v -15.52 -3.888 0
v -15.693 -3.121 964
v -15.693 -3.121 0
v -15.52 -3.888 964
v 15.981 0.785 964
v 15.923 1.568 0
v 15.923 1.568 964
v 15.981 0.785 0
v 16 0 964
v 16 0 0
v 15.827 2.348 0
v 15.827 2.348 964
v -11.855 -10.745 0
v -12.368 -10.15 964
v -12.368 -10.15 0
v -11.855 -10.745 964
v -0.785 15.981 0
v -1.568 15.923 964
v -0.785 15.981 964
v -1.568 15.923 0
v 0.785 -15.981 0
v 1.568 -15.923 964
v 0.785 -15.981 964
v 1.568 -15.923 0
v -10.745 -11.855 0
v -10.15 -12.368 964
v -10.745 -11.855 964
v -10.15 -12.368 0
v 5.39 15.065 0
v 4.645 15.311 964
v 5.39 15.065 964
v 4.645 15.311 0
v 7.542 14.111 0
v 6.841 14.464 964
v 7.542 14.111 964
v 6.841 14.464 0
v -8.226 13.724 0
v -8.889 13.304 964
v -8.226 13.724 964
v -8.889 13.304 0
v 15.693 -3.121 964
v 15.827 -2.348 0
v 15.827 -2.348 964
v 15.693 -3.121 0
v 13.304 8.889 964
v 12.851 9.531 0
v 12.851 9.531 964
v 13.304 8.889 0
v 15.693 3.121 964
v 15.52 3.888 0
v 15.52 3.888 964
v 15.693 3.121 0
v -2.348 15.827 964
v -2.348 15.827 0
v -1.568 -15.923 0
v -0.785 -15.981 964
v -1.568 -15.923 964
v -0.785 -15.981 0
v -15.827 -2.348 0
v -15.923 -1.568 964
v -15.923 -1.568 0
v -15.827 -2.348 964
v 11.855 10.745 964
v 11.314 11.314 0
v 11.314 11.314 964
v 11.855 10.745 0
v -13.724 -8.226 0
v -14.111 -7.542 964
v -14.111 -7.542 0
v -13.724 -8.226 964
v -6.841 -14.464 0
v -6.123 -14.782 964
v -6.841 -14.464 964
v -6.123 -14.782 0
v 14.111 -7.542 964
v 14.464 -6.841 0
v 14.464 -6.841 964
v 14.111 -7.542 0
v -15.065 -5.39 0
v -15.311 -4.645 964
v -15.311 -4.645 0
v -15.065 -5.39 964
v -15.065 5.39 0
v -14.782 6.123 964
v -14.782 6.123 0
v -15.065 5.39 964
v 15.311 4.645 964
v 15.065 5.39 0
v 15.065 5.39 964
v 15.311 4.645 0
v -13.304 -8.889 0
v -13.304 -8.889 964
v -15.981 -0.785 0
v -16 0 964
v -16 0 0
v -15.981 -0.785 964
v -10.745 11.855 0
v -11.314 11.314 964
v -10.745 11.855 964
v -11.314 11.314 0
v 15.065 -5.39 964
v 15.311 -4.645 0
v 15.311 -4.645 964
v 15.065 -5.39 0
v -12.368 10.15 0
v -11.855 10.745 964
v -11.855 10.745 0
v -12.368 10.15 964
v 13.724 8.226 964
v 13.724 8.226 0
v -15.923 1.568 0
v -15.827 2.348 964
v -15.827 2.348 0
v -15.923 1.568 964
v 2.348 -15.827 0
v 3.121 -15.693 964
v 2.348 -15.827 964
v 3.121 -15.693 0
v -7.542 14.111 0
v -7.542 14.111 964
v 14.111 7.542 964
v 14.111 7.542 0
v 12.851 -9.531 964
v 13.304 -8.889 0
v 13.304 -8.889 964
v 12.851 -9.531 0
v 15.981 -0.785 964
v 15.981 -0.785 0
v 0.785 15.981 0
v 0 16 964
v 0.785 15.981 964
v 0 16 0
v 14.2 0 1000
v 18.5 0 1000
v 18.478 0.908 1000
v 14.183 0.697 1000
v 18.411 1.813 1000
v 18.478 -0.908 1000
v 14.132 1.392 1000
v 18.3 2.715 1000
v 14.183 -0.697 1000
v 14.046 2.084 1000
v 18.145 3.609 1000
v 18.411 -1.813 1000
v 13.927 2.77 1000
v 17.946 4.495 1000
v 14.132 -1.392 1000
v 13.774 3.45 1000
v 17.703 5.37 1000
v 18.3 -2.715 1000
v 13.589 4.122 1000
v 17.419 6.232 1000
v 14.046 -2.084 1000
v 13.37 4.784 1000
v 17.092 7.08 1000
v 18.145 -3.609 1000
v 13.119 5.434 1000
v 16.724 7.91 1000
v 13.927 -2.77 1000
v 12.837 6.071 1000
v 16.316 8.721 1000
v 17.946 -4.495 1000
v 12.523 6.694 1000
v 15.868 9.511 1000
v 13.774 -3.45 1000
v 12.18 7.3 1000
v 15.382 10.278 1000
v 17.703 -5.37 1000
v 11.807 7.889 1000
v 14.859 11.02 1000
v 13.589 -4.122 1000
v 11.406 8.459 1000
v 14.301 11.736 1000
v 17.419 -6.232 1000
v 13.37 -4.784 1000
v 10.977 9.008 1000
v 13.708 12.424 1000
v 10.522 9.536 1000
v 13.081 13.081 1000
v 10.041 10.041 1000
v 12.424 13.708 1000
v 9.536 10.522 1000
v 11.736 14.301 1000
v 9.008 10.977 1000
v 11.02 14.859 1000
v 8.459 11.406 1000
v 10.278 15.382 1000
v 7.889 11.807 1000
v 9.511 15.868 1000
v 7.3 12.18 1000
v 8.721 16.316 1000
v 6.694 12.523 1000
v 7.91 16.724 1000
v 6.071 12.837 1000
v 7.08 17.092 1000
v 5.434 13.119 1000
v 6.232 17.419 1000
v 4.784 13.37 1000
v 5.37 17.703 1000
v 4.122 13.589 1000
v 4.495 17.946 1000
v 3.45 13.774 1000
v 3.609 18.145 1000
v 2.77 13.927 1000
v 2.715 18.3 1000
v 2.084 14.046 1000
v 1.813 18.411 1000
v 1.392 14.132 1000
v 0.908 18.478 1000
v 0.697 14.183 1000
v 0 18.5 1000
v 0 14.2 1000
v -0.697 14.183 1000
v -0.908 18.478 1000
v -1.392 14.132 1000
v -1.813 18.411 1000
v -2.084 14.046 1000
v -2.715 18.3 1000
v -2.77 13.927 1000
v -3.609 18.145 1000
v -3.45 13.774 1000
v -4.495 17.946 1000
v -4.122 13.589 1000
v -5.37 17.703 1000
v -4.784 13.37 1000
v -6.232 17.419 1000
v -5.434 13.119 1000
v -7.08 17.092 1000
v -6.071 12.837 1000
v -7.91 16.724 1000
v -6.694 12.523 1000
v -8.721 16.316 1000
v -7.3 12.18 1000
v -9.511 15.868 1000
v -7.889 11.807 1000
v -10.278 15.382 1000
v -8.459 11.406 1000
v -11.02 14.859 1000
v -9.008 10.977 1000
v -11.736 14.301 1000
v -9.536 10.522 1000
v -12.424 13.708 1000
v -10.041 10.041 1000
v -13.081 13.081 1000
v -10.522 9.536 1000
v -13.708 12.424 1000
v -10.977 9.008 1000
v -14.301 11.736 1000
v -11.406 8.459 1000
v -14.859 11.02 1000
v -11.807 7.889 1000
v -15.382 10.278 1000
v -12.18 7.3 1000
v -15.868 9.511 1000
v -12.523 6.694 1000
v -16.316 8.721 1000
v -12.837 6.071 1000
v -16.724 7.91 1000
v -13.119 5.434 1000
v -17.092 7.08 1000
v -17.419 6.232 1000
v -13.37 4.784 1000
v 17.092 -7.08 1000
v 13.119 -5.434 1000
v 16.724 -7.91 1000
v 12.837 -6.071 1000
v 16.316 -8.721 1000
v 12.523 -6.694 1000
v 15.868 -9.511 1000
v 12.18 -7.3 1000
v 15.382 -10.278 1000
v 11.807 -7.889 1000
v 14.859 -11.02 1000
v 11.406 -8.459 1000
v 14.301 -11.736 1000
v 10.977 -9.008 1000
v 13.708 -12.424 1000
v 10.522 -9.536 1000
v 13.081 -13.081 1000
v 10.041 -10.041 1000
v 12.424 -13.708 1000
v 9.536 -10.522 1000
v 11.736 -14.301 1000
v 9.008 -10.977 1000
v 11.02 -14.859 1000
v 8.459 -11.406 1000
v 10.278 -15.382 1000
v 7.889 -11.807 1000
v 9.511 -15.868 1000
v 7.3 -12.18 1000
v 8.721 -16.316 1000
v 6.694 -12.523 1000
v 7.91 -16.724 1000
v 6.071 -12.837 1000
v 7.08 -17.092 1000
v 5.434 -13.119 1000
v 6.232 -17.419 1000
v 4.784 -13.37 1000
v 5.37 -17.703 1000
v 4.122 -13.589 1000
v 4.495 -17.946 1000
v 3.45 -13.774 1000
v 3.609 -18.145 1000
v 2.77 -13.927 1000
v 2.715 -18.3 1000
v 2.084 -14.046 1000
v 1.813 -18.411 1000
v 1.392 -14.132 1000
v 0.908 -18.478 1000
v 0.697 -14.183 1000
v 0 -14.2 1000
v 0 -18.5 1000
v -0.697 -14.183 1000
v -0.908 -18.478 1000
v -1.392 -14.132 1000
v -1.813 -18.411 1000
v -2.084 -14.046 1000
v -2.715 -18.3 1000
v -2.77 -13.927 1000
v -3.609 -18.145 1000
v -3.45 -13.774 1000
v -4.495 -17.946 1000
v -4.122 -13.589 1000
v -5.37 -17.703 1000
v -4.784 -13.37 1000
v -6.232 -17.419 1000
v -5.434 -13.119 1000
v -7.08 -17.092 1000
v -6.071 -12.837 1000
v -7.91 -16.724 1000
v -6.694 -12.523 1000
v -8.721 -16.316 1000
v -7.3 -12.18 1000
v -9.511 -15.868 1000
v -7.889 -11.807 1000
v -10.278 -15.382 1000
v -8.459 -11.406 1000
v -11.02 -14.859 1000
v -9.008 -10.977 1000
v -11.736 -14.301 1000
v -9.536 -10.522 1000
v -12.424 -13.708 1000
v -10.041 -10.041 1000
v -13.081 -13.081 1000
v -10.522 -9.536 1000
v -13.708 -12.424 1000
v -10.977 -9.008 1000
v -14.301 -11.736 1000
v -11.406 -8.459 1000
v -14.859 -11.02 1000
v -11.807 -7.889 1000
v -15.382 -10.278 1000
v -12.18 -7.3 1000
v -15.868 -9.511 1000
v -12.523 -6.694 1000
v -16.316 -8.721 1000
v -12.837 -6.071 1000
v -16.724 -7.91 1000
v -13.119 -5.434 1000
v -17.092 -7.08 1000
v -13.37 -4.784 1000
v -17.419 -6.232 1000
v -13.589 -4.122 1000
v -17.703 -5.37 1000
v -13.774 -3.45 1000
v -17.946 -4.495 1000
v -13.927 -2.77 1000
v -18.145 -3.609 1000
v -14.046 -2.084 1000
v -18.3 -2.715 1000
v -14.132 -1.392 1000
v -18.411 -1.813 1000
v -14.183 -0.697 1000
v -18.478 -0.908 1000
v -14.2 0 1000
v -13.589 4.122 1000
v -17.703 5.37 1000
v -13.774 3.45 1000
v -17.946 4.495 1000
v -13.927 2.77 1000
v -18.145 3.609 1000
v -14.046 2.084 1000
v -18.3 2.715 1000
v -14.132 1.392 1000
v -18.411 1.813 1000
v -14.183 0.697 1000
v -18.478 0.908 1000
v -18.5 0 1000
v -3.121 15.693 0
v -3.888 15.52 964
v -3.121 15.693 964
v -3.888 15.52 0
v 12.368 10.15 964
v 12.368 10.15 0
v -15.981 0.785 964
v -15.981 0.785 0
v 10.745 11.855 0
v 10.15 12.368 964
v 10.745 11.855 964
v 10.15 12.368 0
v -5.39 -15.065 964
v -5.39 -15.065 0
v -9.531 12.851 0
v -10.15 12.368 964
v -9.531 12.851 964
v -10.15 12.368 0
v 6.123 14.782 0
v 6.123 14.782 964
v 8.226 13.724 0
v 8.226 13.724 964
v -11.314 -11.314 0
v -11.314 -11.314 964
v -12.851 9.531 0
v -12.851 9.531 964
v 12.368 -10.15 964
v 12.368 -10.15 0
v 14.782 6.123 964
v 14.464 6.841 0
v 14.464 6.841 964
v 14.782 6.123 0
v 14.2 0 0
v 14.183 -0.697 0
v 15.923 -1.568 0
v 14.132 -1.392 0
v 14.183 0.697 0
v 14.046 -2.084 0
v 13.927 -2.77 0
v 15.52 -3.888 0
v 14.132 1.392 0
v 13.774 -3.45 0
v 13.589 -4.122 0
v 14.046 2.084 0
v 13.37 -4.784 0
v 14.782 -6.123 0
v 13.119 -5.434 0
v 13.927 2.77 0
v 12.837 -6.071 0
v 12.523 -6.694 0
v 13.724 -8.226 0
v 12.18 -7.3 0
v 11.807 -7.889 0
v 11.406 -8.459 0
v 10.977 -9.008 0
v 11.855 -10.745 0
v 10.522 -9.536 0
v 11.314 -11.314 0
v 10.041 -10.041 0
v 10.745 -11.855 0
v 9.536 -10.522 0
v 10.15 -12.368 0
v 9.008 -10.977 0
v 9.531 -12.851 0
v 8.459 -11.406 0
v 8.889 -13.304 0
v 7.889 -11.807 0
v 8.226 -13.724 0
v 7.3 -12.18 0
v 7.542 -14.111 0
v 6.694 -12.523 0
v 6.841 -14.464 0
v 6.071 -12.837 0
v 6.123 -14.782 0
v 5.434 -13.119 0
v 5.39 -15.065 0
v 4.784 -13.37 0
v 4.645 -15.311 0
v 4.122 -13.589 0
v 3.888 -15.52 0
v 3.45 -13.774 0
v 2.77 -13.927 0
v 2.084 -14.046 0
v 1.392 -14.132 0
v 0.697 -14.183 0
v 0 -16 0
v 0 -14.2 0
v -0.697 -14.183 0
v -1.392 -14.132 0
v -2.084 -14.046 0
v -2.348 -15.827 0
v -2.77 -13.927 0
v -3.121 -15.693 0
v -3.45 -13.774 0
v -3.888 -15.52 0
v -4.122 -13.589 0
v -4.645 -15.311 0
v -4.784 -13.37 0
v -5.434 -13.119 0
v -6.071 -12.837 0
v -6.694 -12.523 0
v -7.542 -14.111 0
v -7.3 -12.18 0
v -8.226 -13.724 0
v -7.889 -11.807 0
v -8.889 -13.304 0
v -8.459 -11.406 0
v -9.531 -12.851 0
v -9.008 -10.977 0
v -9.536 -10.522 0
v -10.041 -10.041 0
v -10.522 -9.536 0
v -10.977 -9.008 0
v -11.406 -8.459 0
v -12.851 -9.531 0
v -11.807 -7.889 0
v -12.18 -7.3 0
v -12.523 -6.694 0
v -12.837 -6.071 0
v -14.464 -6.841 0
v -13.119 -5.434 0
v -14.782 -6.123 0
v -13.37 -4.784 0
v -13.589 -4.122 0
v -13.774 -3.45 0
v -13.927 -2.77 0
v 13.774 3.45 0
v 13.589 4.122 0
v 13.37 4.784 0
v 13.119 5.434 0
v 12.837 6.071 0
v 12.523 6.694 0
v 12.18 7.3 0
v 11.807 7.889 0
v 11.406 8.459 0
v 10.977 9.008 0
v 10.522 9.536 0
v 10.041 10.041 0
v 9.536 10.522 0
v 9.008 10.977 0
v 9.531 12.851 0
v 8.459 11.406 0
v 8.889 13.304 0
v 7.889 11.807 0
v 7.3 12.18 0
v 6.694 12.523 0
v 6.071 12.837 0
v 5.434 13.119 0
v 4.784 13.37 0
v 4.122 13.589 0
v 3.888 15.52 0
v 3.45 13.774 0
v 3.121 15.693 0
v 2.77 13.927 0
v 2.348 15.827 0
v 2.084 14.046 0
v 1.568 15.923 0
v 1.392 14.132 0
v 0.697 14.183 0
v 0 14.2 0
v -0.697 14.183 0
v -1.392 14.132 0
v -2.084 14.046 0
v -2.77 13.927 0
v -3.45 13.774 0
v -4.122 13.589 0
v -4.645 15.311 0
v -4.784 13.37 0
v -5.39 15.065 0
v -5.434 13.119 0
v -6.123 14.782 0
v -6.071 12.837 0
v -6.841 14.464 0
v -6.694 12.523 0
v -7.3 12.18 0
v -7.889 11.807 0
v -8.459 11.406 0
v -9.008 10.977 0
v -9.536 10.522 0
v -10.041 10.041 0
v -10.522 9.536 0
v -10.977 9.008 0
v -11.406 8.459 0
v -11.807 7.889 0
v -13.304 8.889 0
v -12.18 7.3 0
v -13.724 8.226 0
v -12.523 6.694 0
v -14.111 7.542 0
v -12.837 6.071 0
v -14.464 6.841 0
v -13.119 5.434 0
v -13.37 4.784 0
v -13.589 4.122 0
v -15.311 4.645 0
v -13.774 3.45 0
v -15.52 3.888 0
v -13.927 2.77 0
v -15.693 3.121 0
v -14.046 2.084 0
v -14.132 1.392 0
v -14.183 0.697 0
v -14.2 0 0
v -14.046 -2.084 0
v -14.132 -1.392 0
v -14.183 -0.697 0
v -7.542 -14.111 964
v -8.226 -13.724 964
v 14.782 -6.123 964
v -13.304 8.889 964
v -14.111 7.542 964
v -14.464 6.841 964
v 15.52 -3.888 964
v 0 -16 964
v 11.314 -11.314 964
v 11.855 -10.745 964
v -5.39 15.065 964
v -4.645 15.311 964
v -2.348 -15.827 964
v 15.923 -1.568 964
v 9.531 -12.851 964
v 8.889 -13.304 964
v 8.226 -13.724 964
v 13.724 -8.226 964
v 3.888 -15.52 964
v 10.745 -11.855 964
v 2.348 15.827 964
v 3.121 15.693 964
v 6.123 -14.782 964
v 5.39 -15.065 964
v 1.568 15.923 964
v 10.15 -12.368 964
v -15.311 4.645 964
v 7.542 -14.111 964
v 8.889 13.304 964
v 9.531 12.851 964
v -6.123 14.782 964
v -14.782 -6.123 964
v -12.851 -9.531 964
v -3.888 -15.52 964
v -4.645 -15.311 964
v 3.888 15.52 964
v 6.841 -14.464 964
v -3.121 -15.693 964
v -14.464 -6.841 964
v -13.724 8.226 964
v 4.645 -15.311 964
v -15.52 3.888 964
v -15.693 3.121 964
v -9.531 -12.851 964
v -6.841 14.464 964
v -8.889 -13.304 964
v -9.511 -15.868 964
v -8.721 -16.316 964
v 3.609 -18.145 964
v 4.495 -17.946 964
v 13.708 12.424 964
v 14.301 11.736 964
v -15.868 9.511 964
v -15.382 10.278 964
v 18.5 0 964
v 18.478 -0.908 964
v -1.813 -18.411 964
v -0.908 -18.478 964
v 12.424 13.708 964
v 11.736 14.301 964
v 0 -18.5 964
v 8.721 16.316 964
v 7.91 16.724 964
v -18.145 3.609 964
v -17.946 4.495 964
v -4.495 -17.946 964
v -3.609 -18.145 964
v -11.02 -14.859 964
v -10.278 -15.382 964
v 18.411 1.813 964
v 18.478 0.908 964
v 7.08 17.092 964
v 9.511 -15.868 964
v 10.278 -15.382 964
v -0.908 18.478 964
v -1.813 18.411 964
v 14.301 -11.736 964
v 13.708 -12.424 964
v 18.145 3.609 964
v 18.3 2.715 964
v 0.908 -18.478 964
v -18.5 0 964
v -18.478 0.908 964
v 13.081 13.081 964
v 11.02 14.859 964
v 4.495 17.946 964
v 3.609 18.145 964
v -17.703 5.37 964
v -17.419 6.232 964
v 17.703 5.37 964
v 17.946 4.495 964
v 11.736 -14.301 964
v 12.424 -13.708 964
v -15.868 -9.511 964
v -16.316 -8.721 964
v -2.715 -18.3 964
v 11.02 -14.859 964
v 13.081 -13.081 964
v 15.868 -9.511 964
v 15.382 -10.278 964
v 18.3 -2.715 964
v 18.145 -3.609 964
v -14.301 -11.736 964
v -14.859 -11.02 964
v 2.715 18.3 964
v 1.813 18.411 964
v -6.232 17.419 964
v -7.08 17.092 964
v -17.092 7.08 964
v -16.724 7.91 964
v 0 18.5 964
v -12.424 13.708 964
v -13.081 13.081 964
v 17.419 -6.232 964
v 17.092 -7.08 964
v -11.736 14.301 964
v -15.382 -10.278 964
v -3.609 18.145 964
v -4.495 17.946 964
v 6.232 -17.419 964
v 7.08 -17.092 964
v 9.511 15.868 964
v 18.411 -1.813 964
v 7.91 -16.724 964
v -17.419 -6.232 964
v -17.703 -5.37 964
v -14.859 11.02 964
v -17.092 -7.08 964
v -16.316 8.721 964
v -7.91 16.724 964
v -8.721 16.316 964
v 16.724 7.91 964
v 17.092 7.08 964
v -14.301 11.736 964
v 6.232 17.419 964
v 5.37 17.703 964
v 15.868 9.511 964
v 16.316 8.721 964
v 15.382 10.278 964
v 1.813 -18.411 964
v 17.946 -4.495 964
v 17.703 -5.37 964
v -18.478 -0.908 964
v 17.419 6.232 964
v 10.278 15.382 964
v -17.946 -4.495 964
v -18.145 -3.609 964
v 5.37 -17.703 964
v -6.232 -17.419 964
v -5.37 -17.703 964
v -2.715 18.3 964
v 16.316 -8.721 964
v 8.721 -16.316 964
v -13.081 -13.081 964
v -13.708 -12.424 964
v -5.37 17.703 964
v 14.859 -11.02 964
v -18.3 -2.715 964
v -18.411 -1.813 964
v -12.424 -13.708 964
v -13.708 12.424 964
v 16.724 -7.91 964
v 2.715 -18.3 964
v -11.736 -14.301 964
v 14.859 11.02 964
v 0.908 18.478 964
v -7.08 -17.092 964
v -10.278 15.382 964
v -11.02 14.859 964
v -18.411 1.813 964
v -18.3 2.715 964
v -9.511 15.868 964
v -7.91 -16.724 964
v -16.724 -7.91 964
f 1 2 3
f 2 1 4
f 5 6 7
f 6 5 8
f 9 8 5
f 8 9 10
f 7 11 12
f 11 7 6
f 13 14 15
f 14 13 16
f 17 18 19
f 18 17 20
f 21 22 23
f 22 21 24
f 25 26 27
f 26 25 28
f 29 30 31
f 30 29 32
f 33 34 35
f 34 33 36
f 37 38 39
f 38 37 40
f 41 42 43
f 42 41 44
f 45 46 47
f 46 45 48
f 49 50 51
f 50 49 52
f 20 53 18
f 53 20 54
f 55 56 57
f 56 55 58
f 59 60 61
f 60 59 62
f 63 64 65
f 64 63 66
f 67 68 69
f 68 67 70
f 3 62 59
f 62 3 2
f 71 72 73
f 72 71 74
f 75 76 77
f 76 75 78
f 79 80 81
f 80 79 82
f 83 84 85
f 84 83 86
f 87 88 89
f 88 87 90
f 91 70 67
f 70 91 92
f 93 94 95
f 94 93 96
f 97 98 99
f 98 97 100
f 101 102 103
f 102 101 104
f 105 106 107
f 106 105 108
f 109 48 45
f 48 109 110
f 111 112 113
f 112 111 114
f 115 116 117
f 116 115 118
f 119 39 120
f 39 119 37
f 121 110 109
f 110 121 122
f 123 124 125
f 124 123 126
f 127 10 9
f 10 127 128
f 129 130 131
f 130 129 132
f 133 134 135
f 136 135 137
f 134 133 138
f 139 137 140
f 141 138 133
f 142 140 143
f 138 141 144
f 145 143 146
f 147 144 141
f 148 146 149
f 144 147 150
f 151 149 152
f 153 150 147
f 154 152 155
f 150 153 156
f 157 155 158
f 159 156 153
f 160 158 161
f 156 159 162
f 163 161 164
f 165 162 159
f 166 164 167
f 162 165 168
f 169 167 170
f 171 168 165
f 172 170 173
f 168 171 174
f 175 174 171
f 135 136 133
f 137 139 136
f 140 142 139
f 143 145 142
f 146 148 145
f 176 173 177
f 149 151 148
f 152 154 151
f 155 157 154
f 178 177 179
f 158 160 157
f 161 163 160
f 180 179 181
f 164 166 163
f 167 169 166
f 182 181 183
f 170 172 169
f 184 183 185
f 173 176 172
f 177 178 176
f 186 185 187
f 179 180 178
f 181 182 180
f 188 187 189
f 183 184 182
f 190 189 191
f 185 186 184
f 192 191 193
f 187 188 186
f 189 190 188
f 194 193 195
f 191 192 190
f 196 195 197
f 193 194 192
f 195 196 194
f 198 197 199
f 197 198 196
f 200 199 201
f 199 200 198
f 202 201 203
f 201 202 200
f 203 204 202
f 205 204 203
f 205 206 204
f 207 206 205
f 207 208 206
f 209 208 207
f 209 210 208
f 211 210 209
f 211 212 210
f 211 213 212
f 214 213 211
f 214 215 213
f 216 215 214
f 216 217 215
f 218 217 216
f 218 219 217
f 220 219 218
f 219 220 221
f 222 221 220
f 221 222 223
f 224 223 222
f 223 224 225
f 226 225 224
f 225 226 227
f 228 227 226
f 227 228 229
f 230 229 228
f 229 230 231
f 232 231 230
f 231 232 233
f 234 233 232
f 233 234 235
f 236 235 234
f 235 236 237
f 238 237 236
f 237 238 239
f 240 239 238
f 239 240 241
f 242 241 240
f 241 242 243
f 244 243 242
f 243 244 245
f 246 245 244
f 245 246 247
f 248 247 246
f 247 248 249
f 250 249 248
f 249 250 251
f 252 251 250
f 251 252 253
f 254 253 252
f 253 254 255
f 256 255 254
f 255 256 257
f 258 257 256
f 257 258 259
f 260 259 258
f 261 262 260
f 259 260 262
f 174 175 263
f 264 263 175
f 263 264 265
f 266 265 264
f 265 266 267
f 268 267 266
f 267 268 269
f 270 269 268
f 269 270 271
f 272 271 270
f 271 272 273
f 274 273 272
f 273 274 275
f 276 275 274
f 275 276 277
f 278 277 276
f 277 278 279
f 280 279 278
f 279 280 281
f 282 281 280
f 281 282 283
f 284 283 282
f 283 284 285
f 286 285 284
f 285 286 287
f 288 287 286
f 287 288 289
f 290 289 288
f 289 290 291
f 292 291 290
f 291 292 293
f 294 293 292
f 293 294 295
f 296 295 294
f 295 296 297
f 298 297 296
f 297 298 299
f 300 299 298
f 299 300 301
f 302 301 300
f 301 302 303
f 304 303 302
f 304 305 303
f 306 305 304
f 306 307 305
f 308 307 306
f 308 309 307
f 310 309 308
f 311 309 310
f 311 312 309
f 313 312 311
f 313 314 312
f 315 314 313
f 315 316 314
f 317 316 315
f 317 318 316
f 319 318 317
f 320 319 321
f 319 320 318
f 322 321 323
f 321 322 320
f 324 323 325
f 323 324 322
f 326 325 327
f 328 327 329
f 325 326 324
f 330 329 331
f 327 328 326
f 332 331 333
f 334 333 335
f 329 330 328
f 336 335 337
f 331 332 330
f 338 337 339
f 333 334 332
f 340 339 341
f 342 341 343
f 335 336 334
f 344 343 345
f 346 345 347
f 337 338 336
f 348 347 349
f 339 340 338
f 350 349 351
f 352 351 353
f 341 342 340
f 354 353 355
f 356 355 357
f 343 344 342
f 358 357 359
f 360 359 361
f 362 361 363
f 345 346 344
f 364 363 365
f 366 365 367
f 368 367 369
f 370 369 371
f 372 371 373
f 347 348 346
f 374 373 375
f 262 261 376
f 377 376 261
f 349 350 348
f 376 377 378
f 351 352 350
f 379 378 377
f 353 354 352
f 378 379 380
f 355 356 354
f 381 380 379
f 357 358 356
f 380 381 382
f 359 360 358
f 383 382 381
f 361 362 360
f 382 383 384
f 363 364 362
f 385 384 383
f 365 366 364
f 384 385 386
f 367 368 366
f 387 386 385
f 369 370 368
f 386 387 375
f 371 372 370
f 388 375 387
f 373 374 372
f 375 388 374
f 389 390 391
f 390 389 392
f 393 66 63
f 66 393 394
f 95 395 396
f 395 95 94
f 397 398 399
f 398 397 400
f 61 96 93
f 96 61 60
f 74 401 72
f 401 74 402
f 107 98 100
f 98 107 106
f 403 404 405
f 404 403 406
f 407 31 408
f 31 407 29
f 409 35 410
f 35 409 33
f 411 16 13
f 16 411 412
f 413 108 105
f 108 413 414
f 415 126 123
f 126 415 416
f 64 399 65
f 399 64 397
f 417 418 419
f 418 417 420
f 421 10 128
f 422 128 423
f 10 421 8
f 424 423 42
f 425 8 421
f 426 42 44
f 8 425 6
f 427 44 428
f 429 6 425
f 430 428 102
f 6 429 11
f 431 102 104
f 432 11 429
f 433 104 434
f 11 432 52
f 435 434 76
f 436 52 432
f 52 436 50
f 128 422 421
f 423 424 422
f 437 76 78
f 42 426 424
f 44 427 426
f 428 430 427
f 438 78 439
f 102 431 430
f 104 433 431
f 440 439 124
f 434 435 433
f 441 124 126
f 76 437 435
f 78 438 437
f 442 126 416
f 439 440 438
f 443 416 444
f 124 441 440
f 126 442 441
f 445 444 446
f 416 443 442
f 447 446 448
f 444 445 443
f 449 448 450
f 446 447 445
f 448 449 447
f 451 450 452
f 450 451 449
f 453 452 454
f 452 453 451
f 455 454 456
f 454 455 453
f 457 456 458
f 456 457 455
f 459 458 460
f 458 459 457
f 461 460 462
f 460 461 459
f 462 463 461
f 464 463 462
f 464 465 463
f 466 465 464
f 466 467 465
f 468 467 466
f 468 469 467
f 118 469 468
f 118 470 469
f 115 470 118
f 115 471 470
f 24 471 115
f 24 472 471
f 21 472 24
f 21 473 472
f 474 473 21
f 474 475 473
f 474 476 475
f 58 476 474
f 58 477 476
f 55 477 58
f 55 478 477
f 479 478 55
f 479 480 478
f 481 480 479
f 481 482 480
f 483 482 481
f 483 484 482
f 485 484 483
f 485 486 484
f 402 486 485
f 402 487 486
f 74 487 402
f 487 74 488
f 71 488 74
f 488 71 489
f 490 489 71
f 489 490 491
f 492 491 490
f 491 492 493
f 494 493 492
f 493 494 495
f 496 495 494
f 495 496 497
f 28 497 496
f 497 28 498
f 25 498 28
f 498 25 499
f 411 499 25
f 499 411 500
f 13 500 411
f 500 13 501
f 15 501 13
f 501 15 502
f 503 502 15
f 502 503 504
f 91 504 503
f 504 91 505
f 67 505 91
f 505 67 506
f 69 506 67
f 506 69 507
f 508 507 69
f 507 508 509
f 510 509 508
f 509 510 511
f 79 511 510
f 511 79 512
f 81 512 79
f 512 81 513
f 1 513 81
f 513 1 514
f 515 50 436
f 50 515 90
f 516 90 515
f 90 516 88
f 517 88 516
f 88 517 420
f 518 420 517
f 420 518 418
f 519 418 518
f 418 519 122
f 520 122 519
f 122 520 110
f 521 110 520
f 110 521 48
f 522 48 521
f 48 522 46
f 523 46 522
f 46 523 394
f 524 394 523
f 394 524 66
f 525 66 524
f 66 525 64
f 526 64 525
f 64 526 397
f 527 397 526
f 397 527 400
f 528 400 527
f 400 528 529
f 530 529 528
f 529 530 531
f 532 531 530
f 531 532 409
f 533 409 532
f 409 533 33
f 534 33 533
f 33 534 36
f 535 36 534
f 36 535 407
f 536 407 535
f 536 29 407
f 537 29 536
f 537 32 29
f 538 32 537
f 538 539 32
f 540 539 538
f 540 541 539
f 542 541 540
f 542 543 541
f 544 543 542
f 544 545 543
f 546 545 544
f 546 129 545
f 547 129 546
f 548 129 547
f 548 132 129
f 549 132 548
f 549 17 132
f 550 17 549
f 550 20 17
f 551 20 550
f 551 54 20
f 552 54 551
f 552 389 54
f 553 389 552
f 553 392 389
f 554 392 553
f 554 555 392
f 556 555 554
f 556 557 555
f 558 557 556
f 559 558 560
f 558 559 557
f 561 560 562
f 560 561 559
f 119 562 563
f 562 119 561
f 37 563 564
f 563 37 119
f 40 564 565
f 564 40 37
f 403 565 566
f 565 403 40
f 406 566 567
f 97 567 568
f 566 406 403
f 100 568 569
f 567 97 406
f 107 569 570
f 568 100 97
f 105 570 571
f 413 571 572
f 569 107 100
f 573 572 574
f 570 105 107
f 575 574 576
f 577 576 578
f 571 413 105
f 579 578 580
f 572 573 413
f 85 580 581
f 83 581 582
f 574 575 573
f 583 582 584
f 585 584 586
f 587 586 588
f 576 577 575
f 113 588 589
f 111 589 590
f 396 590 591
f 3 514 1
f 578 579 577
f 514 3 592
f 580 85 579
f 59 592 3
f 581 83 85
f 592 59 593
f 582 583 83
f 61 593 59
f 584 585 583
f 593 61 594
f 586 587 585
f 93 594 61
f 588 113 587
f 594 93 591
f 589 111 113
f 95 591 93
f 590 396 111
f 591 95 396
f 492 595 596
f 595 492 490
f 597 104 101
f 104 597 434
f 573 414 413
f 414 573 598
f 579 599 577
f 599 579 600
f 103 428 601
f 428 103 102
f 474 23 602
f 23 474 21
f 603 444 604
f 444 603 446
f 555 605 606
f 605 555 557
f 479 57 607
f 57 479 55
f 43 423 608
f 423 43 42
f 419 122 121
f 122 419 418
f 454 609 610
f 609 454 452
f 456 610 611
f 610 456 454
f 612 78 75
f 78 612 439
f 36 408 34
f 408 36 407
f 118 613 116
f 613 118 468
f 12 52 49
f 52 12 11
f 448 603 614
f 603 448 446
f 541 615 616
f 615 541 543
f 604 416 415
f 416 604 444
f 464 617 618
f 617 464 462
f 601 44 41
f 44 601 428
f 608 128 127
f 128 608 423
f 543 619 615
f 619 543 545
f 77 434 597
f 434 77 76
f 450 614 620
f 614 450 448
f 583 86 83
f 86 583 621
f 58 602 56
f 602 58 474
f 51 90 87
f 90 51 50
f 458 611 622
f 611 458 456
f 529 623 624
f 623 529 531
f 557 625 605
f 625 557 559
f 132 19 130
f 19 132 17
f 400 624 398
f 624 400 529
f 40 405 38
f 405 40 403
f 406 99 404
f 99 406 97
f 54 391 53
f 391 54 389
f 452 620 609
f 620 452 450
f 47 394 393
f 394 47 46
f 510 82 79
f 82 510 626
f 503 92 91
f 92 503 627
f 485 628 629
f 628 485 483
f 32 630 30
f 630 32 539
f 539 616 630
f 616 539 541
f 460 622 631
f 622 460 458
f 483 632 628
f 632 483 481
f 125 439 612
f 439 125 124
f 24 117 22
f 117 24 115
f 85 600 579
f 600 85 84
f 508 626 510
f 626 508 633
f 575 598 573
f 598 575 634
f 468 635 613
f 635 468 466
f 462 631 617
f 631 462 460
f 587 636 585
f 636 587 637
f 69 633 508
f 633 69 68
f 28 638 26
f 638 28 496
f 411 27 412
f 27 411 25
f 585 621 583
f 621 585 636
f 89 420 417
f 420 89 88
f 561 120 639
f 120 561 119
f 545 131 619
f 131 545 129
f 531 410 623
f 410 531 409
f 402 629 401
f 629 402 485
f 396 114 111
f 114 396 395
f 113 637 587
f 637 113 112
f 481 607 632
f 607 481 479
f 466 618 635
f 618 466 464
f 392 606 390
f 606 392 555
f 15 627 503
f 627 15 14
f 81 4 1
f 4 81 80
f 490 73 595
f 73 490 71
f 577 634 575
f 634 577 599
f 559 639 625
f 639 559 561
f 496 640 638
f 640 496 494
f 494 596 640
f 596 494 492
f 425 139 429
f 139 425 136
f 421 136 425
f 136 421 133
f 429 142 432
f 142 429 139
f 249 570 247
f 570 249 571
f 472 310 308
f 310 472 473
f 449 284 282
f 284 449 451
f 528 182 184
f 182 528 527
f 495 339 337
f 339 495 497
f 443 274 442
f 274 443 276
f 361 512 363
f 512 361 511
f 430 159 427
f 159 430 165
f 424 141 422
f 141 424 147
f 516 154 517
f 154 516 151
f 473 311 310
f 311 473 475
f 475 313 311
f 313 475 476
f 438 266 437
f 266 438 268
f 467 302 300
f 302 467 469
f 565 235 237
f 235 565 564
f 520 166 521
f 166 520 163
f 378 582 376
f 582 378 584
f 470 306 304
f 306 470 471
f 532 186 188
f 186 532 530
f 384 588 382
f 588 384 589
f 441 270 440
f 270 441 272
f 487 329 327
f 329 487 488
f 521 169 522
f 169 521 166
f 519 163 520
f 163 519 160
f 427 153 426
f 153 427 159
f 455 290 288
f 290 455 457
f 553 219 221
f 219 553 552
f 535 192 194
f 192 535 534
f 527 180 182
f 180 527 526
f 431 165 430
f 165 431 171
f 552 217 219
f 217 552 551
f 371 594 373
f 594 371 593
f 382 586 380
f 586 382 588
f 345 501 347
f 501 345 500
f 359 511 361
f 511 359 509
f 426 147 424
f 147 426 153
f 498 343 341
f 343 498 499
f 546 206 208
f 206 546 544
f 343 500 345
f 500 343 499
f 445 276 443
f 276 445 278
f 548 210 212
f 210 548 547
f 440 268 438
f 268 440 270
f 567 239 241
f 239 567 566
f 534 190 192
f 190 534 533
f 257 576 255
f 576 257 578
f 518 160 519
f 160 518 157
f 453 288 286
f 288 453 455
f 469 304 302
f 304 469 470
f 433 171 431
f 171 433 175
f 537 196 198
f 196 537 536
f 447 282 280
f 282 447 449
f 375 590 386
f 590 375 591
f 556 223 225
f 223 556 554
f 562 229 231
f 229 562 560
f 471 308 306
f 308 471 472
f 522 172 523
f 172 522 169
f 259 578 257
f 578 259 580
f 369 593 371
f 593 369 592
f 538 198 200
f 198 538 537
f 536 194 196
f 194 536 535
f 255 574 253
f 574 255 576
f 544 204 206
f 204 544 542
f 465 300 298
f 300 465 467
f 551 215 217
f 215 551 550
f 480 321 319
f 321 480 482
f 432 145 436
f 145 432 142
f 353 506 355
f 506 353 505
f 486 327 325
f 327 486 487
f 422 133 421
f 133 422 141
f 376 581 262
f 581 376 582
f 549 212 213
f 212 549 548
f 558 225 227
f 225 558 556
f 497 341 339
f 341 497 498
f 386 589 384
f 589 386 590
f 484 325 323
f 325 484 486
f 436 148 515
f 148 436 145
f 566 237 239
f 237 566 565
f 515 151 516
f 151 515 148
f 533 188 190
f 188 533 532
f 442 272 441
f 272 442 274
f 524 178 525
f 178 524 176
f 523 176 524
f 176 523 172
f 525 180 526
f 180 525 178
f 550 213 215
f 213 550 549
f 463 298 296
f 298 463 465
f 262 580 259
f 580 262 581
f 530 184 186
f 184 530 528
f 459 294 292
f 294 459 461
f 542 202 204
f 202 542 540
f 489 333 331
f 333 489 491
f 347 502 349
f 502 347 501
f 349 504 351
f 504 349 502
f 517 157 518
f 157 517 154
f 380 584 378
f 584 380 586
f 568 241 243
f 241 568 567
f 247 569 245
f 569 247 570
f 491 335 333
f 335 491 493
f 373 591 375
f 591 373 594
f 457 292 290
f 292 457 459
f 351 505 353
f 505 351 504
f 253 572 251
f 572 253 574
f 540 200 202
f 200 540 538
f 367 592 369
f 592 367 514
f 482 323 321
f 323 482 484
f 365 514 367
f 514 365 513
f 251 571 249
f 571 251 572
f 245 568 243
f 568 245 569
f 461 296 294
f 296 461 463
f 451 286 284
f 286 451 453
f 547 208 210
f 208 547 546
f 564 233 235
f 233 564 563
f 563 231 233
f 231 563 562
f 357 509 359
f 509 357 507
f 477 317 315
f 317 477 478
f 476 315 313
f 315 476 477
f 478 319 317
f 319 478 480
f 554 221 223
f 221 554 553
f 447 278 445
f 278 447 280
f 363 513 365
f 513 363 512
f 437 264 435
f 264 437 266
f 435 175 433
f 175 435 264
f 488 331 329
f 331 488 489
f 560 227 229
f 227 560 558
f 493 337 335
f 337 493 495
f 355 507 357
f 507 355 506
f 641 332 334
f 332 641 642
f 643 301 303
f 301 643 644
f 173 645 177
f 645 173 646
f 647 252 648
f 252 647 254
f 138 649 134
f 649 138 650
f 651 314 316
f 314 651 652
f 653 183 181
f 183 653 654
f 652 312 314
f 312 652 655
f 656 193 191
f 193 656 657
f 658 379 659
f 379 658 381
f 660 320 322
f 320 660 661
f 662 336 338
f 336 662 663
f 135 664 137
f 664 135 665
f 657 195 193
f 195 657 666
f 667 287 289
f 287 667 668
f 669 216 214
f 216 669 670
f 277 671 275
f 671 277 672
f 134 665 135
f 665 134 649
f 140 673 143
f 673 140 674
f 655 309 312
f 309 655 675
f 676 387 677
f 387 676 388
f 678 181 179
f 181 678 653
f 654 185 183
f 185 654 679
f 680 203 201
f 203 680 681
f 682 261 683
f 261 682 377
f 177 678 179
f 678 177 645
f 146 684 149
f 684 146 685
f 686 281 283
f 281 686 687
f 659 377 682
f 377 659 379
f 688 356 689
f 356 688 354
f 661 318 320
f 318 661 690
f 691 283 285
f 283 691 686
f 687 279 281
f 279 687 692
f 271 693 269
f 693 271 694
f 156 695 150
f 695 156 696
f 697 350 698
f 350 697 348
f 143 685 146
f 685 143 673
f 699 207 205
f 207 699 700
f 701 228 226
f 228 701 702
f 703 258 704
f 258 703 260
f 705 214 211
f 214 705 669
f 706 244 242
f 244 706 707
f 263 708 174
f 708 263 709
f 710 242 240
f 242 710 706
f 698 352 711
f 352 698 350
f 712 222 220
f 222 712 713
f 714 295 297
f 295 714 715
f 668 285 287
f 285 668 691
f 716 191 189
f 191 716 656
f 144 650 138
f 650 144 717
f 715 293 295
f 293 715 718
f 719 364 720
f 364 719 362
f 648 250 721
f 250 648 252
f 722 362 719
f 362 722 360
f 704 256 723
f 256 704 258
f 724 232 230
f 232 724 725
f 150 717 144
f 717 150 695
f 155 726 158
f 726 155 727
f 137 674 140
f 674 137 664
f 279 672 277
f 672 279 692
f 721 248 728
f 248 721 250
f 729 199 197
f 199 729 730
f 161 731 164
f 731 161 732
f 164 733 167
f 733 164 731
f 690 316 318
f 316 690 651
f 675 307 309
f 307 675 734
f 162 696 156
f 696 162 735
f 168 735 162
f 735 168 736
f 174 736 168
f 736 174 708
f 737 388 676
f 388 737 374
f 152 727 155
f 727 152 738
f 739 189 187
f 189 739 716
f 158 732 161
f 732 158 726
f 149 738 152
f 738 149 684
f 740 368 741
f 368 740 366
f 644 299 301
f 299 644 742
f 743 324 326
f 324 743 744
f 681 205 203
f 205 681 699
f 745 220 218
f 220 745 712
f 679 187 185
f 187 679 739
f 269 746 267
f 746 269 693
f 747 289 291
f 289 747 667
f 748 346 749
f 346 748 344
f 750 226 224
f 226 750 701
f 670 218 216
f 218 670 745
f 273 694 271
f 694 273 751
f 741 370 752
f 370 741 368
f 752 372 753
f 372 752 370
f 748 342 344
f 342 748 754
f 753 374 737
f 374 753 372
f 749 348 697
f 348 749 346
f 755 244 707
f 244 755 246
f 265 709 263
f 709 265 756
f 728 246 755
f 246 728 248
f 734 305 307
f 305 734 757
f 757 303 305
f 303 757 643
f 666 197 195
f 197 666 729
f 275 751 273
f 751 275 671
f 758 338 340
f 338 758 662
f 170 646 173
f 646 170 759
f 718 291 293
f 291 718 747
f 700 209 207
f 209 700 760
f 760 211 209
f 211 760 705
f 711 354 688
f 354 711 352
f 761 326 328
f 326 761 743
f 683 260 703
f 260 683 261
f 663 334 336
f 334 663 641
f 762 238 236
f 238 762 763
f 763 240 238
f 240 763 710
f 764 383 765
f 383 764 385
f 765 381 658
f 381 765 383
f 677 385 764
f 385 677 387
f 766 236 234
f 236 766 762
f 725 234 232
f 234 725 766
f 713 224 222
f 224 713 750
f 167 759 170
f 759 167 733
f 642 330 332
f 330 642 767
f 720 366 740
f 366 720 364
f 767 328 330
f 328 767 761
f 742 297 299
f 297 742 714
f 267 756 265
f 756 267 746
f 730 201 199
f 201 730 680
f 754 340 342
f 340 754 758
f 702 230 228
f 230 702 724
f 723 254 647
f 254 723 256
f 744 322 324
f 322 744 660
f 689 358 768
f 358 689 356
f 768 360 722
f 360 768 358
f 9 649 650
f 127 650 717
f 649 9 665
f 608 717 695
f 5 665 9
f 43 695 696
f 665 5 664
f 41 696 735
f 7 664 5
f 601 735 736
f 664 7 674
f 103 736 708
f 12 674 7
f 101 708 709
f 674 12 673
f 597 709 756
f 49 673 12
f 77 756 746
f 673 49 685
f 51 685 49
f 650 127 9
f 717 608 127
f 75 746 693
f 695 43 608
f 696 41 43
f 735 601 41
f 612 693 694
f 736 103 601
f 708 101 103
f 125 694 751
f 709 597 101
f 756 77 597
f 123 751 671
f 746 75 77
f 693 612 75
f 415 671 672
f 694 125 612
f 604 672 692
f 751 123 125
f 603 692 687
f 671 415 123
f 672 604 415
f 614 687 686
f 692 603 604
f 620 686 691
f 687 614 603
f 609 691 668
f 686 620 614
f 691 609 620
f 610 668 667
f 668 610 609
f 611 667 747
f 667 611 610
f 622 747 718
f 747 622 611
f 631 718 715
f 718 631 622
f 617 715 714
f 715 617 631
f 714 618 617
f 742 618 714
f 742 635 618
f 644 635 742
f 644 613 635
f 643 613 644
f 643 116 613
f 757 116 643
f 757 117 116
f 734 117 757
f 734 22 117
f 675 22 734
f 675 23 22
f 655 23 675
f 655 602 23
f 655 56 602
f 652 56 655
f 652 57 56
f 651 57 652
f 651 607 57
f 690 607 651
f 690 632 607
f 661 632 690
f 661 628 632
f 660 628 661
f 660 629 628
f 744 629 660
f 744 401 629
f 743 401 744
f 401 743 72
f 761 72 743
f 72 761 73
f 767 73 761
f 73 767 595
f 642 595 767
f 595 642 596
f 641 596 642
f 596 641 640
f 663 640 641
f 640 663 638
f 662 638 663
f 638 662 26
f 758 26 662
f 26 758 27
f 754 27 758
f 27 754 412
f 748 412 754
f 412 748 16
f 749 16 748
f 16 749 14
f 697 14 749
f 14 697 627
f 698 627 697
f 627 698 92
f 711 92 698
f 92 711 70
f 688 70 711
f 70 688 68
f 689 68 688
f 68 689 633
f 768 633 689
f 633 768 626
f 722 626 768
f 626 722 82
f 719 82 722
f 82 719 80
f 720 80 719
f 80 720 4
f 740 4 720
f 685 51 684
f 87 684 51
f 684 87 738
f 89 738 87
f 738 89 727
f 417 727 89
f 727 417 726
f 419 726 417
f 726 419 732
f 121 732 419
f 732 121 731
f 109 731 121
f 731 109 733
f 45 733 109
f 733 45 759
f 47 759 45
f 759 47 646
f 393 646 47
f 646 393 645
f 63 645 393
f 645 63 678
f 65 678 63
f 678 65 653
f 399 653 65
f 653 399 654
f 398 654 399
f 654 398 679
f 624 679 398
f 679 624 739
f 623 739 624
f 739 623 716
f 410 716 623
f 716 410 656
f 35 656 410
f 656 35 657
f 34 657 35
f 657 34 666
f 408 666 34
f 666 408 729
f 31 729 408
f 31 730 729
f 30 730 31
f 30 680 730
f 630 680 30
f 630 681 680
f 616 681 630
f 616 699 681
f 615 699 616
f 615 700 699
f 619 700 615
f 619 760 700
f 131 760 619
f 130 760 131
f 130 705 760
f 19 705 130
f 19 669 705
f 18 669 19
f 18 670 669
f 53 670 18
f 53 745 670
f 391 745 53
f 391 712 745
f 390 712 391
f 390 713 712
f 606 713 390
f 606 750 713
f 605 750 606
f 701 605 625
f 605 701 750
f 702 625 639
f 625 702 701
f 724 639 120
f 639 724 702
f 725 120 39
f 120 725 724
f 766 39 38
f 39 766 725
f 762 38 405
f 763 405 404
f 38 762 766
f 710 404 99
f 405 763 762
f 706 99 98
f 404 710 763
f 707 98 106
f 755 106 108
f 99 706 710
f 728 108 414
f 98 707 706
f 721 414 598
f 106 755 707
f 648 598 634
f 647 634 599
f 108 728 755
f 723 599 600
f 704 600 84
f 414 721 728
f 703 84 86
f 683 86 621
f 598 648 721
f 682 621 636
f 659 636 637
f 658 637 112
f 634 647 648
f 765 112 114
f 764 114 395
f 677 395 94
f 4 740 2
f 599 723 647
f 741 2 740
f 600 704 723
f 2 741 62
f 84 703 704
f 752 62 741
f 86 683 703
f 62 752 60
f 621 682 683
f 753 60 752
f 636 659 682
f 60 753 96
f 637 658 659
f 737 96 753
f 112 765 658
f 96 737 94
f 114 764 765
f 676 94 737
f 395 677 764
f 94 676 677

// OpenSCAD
// HT 32 pipe 1000 mm (single connected solid)

// Parameters
length_mm = 1000; //[500:2000:10]
ht32_outer_diameter = 32; //[16:64:1]
ht32_wall_thickness = 1.8; //[0.9:3.6:0.1]
end_fitting_length = 35; //[18:70:1]
end_fitting_radial_add = 2.5; //[1.25:5:0.1]
overlap_mm = 1; //[0.5:2:0.1]
center = 0; //[0:1:1]

$fn = 128;

// HT Pipe - complete geometry
module ht_pipe() {
    outer_r = ht32_outer_diameter/2;
    inner_r = outer_r - ht32_wall_thickness;
    fitting_outer_r = outer_r + end_fitting_radial_add;

    // Robustness epsilons (avoid coincident faces)
    eps = 0.02;

    // Place either at Z=0..L or centered about origin
    z0 = (center == 1) ? -length_mm/2 : 0;

    color([0.85, 0.85, 0.8])  // PVC color
    translate([0, 0, z0])
    union() {
        // Main pipe (hollow)
        difference() {
            cylinder(h=length_mm, r=outer_r, center=false);
            translate([0, 0, -eps])
                cylinder(h=length_mm + 2*eps, r=inner_r, center=false);
        }

        // End fitting (socket) at the "top" end, overlapping into main pipe
        // Connected by overlap_mm (no floating)
        translate([0, 0, length_mm - end_fitting_length - overlap_mm])
        difference() {
            cylinder(h=end_fitting_length + overlap_mm, r=fitting_outer_r, center=false);
            translate([0, 0, -eps])
                cylinder(h=end_fitting_length + overlap_mm + 2*eps, r=inner_r, center=false);
        }
    }
}

// Assembly
module assembly() {
    ht_pipe();
}

assembly();
